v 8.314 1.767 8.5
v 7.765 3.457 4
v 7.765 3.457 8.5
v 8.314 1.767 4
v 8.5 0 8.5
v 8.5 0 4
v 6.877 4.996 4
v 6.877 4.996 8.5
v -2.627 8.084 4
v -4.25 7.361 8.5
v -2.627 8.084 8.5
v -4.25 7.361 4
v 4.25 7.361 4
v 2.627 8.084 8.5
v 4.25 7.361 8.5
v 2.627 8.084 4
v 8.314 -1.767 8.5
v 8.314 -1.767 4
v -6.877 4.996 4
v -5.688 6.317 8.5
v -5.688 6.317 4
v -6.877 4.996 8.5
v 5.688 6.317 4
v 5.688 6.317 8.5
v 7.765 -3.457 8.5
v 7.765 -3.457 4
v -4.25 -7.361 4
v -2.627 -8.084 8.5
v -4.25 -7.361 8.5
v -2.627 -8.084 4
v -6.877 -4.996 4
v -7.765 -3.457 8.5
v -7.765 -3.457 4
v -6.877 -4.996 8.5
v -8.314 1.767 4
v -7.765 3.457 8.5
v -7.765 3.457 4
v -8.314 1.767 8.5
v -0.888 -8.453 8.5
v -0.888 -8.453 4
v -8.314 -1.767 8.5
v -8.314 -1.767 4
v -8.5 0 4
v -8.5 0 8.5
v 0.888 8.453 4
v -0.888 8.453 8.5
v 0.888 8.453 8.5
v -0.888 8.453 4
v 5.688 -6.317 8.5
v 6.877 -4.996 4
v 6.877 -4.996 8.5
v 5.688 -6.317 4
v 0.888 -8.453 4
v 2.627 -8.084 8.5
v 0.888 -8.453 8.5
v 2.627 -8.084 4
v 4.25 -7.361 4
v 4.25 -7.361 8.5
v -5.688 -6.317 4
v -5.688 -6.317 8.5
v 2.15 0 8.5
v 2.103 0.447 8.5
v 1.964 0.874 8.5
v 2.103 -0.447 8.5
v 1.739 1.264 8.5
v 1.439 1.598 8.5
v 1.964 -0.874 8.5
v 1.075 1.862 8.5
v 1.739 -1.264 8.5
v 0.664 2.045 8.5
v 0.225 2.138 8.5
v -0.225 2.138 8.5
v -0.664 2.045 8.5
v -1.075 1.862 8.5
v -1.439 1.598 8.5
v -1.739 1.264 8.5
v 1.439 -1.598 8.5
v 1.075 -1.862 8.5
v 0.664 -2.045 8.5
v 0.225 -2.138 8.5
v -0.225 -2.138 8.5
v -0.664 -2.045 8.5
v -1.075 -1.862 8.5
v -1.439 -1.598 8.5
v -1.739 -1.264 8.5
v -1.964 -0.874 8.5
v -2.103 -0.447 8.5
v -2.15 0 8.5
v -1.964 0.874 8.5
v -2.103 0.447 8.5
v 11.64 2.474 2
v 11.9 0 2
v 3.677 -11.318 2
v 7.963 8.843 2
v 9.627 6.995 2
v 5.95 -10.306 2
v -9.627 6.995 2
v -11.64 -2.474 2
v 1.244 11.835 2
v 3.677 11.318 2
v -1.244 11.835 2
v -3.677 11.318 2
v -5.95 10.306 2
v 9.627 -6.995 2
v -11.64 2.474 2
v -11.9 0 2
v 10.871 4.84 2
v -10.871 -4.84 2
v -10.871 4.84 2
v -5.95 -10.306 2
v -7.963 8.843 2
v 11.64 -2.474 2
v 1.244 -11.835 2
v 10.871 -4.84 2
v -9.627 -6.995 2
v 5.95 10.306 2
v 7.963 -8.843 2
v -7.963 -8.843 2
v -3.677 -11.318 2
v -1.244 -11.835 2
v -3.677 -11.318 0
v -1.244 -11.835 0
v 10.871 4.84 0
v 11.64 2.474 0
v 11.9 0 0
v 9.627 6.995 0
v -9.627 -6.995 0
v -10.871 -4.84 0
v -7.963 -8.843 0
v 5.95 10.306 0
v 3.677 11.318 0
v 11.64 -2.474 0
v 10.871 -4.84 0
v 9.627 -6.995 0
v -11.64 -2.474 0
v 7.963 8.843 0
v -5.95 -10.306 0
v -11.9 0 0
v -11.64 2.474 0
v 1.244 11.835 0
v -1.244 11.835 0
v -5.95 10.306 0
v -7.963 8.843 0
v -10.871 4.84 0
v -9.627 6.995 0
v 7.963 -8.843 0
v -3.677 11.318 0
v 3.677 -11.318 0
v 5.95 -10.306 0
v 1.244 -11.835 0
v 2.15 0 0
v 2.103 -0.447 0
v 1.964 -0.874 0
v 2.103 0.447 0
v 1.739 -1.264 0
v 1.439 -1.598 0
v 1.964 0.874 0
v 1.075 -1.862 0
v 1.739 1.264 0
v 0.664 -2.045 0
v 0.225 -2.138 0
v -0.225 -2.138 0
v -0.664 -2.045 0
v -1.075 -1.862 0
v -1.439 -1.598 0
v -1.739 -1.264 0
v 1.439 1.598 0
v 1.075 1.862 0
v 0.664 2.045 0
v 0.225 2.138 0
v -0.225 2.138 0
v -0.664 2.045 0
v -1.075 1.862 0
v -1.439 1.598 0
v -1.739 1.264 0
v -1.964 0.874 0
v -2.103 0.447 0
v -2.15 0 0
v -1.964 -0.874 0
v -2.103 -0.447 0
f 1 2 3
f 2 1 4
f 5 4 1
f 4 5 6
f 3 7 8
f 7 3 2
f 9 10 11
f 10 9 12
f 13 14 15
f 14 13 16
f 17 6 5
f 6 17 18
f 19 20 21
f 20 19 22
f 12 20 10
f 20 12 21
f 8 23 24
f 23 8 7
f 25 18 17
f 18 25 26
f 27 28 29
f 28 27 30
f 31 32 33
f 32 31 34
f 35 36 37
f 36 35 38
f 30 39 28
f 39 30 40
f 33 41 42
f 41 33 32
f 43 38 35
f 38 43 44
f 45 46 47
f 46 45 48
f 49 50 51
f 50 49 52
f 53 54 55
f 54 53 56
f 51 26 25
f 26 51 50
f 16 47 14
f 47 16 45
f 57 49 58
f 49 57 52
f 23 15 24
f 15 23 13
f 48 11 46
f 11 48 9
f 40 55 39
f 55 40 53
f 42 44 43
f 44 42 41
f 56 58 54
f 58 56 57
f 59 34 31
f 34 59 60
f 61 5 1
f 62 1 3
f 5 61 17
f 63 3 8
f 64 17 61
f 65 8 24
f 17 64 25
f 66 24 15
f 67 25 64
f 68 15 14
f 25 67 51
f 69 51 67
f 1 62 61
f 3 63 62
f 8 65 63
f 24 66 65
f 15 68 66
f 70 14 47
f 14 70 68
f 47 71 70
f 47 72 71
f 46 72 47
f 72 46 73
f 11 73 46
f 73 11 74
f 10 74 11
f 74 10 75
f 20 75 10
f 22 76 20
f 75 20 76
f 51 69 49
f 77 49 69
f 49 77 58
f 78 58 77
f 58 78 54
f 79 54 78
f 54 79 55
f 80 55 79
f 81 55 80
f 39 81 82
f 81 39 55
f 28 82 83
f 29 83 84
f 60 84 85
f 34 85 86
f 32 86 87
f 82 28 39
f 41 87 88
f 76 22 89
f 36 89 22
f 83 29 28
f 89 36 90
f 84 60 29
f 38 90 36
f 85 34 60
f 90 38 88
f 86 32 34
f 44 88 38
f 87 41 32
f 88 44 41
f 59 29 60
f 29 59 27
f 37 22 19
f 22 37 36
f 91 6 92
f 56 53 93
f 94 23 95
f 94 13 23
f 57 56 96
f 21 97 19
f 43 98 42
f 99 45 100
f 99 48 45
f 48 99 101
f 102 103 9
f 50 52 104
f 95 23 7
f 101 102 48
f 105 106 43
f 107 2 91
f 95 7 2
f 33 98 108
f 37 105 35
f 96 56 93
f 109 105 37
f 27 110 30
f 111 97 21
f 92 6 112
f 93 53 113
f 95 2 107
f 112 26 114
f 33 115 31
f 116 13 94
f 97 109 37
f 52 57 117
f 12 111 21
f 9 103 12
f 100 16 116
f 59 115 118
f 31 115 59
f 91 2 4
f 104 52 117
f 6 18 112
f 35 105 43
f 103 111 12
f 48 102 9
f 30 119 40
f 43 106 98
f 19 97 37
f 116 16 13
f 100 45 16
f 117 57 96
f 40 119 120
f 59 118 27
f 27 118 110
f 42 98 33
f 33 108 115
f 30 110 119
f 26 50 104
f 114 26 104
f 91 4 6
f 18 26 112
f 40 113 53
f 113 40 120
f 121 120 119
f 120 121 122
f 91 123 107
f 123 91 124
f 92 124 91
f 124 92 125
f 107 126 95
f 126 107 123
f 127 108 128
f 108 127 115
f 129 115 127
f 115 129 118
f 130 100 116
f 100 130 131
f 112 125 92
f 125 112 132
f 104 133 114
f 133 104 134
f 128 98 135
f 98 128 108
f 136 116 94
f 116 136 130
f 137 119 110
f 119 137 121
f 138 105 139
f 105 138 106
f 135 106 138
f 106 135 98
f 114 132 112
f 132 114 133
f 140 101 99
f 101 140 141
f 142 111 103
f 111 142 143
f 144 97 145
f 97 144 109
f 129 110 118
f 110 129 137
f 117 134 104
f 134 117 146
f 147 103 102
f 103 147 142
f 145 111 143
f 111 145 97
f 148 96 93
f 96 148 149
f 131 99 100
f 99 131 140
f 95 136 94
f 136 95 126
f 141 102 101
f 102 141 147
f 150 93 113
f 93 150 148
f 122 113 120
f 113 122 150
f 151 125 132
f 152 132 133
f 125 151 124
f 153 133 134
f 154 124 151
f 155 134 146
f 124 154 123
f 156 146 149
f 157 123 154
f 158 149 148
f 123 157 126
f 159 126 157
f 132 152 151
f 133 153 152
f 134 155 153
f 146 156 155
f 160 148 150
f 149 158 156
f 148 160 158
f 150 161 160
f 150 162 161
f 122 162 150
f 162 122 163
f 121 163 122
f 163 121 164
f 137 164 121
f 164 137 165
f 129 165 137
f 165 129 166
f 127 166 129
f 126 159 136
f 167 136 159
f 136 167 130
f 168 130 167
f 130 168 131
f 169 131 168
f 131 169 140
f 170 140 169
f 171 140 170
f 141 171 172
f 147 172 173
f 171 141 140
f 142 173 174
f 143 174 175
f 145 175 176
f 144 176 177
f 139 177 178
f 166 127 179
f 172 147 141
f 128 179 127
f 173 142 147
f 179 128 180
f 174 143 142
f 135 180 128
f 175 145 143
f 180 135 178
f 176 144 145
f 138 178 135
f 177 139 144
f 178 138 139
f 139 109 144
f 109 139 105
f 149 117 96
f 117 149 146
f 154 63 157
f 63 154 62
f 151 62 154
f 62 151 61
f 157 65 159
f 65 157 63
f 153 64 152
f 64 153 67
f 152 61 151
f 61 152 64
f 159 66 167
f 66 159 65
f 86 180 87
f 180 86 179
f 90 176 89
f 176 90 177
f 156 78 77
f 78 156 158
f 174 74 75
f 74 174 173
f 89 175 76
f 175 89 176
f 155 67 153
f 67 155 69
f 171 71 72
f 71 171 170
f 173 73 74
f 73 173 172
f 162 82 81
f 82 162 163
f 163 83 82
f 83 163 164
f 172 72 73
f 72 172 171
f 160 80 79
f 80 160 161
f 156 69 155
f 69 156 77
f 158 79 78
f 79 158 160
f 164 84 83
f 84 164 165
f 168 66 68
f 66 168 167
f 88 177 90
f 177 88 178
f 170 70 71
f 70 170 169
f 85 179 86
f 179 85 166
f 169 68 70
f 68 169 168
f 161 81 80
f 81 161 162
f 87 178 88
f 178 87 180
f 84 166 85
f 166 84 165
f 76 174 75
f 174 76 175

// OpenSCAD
$fn = 30;

wheel_diameter = 17;
wheel_width = 4.5;
lip_diameter = 23.8;
lip_width = 2;
support_width = 2;
shaft_diameter = 4.3;

difference(){
    union(){
        //wheel
        translate([0,0,lip_width+support_width])
            cylinder(h=wheel_width, d=wheel_diameter);

        //lip
        translate([0,0,support_width])
            cylinder(d1=lip_diameter, d2=17, h=lip_width);

        //support
        cylinder(d=lip_diameter, h=support_width);
    }

    //shaft
    cylinder(d=shaft_diameter, h=support_width+lip_width+wheel_width);
}
